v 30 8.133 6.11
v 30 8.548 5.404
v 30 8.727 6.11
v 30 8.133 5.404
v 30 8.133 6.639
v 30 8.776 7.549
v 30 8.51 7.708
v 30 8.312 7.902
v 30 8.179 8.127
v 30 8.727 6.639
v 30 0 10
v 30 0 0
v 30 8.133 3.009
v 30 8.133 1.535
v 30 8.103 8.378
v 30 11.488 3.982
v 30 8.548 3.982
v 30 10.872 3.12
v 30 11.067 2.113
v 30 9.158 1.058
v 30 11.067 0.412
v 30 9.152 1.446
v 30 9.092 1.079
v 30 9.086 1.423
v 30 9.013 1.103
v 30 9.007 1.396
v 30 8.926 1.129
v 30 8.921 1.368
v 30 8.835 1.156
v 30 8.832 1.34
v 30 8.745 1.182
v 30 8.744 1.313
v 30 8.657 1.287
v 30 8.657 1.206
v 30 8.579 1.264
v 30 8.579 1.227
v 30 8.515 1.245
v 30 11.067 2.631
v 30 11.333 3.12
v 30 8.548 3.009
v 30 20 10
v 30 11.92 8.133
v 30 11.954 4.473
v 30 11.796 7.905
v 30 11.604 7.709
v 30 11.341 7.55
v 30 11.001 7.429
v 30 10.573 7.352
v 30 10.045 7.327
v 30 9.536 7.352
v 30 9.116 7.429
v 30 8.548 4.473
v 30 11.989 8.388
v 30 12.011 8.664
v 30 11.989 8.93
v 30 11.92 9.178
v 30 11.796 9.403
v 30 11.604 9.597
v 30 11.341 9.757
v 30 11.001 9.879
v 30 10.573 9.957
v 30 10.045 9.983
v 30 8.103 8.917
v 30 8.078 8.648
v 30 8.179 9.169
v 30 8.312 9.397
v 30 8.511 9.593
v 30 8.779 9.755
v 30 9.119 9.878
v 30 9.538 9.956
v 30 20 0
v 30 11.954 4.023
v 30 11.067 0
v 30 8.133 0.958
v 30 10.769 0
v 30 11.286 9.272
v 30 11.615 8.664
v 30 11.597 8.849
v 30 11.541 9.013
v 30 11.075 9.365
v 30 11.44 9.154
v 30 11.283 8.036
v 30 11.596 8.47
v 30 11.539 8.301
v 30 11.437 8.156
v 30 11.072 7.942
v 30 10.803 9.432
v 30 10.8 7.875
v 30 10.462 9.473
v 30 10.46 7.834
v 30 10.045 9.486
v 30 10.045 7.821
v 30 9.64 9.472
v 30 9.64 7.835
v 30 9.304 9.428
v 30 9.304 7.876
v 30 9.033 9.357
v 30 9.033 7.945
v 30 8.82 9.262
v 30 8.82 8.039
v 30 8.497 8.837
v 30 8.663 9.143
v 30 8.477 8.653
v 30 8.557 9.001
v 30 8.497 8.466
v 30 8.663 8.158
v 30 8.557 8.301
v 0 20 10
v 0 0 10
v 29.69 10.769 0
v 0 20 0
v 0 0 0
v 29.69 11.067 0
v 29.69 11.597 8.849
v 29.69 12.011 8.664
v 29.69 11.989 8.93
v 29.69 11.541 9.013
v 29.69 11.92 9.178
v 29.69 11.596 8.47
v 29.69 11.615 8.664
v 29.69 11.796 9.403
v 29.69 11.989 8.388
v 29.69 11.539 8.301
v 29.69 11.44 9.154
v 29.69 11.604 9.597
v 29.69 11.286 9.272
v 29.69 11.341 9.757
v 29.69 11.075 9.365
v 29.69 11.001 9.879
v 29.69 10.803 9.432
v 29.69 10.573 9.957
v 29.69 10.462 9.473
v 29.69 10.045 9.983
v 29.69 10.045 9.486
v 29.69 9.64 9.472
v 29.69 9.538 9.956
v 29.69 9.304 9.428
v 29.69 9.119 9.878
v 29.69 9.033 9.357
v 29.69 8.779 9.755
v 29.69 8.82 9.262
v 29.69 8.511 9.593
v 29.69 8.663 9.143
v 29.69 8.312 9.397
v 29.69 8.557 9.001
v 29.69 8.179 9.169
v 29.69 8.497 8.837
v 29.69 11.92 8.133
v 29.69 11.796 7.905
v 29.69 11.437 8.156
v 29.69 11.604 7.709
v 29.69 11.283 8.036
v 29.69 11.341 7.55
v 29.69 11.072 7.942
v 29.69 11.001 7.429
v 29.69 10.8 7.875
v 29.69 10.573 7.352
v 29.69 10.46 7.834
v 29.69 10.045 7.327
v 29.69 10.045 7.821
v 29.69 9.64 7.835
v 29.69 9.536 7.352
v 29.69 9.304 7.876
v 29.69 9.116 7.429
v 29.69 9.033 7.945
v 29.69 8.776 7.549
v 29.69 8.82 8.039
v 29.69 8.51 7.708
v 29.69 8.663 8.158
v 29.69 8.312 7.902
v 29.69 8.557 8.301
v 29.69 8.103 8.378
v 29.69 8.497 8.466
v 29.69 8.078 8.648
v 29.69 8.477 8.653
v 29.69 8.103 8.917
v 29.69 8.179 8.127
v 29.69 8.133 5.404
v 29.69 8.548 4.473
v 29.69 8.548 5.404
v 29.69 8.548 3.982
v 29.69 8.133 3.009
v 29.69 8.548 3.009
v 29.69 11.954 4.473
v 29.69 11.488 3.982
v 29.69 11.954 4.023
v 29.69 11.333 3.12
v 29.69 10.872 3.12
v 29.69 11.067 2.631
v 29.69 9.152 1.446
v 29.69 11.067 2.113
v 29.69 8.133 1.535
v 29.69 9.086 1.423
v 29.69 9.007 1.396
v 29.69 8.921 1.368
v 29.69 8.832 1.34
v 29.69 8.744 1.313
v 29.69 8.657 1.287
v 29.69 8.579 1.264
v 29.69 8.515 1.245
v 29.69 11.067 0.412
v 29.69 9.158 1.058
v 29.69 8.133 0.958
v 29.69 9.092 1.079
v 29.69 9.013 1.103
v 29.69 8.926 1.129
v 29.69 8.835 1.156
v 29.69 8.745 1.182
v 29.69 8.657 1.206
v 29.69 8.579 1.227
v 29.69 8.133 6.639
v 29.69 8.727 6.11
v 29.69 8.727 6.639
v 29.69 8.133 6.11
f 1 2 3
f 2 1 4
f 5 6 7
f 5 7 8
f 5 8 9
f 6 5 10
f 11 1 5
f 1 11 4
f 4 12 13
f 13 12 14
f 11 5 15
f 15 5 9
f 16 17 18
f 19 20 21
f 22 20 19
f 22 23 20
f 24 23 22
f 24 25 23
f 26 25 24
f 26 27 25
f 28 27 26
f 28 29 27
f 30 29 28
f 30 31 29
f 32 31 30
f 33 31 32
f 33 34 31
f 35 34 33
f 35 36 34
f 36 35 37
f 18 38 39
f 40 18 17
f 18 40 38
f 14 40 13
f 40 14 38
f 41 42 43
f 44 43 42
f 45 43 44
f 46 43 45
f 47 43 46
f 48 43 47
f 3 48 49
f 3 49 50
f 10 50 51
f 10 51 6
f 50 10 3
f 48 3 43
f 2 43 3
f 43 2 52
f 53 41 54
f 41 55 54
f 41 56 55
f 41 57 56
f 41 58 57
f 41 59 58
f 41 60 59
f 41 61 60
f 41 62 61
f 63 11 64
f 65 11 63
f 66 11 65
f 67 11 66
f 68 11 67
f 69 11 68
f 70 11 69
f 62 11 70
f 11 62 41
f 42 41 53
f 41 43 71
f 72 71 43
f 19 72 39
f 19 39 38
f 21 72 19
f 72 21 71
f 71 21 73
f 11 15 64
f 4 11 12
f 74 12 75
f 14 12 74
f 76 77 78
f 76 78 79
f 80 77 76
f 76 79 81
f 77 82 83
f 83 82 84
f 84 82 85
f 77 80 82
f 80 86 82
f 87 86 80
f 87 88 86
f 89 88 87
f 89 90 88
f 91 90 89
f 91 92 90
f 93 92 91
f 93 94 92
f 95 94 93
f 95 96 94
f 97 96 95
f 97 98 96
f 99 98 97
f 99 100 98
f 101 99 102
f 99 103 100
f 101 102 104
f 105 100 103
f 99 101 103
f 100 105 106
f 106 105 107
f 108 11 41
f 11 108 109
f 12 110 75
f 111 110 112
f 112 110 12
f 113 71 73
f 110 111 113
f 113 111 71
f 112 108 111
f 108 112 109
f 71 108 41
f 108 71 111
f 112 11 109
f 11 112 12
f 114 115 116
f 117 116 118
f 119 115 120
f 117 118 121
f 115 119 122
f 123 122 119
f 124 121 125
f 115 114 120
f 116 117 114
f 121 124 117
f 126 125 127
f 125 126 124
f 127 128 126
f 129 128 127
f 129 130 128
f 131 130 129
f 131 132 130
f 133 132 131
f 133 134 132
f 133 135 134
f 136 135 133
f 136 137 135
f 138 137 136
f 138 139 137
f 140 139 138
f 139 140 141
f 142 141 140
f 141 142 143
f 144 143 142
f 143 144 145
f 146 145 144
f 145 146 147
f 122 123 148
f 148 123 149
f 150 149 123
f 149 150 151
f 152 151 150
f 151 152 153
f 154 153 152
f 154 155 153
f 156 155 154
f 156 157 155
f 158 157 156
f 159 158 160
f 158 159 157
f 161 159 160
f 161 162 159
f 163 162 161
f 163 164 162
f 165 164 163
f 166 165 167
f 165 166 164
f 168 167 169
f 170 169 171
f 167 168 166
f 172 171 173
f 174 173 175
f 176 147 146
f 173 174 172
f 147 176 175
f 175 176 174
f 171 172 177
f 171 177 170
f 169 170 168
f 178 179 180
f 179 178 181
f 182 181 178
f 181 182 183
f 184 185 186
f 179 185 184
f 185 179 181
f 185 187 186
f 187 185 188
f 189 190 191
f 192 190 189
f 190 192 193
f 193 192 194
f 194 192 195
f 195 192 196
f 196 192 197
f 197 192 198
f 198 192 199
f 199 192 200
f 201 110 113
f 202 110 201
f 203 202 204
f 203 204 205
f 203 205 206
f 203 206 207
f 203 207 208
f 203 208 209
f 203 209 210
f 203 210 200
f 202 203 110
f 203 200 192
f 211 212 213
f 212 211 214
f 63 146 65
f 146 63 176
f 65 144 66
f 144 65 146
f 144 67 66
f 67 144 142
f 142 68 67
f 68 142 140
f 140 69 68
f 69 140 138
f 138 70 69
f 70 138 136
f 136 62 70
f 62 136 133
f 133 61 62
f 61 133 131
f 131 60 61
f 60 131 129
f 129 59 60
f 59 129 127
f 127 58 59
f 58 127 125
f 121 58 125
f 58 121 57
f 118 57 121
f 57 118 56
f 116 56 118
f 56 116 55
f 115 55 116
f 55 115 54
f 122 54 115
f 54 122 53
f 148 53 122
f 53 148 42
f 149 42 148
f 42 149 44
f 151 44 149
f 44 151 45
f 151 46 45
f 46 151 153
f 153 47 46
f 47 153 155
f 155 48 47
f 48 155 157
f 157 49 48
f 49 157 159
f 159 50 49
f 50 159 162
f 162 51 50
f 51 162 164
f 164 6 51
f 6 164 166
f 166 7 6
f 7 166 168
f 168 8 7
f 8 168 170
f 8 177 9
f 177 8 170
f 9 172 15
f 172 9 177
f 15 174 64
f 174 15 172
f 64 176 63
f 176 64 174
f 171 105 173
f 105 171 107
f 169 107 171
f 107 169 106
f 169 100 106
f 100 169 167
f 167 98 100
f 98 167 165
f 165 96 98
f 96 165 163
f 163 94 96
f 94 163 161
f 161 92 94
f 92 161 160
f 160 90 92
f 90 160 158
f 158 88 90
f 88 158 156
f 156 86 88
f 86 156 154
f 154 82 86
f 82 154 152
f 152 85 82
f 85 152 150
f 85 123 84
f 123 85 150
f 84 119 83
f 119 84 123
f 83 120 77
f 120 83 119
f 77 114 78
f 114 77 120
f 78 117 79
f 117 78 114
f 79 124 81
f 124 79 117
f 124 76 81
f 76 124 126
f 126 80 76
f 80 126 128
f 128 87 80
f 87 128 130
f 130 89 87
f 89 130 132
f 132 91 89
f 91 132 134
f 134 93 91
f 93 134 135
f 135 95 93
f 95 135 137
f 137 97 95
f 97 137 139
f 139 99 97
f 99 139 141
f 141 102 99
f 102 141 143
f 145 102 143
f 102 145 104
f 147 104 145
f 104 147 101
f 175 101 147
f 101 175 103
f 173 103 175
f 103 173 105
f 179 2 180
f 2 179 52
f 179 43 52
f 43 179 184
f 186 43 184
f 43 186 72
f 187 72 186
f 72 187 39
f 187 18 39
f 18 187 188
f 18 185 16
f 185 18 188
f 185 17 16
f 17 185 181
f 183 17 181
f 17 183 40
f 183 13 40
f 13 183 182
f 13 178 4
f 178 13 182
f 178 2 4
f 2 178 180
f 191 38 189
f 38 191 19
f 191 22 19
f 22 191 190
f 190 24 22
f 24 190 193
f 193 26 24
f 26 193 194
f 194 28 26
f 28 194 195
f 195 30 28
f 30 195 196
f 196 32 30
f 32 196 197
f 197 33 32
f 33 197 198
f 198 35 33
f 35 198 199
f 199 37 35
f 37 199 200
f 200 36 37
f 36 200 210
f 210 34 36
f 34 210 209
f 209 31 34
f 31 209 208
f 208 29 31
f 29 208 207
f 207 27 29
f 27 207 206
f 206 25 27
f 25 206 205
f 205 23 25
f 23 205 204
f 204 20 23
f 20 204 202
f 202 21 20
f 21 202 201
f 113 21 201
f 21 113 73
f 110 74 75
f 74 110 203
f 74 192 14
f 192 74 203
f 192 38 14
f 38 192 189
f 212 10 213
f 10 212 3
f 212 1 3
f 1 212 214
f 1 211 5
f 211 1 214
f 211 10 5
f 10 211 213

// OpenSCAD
// Generated by scadwright. Do not hand-edit —
// edit the Python source and regenerate.

difference() {
    cube([30, 20, 10], center=false);
    translate([30.5, 10, 5]) {
        rotate(a=90, v=[0, -1, 0]) {
            linear_extrude(height=0.81, center=false) {
                text("v1.0", size=4, halign="center", valign="center");
            }
        }
    }
}
